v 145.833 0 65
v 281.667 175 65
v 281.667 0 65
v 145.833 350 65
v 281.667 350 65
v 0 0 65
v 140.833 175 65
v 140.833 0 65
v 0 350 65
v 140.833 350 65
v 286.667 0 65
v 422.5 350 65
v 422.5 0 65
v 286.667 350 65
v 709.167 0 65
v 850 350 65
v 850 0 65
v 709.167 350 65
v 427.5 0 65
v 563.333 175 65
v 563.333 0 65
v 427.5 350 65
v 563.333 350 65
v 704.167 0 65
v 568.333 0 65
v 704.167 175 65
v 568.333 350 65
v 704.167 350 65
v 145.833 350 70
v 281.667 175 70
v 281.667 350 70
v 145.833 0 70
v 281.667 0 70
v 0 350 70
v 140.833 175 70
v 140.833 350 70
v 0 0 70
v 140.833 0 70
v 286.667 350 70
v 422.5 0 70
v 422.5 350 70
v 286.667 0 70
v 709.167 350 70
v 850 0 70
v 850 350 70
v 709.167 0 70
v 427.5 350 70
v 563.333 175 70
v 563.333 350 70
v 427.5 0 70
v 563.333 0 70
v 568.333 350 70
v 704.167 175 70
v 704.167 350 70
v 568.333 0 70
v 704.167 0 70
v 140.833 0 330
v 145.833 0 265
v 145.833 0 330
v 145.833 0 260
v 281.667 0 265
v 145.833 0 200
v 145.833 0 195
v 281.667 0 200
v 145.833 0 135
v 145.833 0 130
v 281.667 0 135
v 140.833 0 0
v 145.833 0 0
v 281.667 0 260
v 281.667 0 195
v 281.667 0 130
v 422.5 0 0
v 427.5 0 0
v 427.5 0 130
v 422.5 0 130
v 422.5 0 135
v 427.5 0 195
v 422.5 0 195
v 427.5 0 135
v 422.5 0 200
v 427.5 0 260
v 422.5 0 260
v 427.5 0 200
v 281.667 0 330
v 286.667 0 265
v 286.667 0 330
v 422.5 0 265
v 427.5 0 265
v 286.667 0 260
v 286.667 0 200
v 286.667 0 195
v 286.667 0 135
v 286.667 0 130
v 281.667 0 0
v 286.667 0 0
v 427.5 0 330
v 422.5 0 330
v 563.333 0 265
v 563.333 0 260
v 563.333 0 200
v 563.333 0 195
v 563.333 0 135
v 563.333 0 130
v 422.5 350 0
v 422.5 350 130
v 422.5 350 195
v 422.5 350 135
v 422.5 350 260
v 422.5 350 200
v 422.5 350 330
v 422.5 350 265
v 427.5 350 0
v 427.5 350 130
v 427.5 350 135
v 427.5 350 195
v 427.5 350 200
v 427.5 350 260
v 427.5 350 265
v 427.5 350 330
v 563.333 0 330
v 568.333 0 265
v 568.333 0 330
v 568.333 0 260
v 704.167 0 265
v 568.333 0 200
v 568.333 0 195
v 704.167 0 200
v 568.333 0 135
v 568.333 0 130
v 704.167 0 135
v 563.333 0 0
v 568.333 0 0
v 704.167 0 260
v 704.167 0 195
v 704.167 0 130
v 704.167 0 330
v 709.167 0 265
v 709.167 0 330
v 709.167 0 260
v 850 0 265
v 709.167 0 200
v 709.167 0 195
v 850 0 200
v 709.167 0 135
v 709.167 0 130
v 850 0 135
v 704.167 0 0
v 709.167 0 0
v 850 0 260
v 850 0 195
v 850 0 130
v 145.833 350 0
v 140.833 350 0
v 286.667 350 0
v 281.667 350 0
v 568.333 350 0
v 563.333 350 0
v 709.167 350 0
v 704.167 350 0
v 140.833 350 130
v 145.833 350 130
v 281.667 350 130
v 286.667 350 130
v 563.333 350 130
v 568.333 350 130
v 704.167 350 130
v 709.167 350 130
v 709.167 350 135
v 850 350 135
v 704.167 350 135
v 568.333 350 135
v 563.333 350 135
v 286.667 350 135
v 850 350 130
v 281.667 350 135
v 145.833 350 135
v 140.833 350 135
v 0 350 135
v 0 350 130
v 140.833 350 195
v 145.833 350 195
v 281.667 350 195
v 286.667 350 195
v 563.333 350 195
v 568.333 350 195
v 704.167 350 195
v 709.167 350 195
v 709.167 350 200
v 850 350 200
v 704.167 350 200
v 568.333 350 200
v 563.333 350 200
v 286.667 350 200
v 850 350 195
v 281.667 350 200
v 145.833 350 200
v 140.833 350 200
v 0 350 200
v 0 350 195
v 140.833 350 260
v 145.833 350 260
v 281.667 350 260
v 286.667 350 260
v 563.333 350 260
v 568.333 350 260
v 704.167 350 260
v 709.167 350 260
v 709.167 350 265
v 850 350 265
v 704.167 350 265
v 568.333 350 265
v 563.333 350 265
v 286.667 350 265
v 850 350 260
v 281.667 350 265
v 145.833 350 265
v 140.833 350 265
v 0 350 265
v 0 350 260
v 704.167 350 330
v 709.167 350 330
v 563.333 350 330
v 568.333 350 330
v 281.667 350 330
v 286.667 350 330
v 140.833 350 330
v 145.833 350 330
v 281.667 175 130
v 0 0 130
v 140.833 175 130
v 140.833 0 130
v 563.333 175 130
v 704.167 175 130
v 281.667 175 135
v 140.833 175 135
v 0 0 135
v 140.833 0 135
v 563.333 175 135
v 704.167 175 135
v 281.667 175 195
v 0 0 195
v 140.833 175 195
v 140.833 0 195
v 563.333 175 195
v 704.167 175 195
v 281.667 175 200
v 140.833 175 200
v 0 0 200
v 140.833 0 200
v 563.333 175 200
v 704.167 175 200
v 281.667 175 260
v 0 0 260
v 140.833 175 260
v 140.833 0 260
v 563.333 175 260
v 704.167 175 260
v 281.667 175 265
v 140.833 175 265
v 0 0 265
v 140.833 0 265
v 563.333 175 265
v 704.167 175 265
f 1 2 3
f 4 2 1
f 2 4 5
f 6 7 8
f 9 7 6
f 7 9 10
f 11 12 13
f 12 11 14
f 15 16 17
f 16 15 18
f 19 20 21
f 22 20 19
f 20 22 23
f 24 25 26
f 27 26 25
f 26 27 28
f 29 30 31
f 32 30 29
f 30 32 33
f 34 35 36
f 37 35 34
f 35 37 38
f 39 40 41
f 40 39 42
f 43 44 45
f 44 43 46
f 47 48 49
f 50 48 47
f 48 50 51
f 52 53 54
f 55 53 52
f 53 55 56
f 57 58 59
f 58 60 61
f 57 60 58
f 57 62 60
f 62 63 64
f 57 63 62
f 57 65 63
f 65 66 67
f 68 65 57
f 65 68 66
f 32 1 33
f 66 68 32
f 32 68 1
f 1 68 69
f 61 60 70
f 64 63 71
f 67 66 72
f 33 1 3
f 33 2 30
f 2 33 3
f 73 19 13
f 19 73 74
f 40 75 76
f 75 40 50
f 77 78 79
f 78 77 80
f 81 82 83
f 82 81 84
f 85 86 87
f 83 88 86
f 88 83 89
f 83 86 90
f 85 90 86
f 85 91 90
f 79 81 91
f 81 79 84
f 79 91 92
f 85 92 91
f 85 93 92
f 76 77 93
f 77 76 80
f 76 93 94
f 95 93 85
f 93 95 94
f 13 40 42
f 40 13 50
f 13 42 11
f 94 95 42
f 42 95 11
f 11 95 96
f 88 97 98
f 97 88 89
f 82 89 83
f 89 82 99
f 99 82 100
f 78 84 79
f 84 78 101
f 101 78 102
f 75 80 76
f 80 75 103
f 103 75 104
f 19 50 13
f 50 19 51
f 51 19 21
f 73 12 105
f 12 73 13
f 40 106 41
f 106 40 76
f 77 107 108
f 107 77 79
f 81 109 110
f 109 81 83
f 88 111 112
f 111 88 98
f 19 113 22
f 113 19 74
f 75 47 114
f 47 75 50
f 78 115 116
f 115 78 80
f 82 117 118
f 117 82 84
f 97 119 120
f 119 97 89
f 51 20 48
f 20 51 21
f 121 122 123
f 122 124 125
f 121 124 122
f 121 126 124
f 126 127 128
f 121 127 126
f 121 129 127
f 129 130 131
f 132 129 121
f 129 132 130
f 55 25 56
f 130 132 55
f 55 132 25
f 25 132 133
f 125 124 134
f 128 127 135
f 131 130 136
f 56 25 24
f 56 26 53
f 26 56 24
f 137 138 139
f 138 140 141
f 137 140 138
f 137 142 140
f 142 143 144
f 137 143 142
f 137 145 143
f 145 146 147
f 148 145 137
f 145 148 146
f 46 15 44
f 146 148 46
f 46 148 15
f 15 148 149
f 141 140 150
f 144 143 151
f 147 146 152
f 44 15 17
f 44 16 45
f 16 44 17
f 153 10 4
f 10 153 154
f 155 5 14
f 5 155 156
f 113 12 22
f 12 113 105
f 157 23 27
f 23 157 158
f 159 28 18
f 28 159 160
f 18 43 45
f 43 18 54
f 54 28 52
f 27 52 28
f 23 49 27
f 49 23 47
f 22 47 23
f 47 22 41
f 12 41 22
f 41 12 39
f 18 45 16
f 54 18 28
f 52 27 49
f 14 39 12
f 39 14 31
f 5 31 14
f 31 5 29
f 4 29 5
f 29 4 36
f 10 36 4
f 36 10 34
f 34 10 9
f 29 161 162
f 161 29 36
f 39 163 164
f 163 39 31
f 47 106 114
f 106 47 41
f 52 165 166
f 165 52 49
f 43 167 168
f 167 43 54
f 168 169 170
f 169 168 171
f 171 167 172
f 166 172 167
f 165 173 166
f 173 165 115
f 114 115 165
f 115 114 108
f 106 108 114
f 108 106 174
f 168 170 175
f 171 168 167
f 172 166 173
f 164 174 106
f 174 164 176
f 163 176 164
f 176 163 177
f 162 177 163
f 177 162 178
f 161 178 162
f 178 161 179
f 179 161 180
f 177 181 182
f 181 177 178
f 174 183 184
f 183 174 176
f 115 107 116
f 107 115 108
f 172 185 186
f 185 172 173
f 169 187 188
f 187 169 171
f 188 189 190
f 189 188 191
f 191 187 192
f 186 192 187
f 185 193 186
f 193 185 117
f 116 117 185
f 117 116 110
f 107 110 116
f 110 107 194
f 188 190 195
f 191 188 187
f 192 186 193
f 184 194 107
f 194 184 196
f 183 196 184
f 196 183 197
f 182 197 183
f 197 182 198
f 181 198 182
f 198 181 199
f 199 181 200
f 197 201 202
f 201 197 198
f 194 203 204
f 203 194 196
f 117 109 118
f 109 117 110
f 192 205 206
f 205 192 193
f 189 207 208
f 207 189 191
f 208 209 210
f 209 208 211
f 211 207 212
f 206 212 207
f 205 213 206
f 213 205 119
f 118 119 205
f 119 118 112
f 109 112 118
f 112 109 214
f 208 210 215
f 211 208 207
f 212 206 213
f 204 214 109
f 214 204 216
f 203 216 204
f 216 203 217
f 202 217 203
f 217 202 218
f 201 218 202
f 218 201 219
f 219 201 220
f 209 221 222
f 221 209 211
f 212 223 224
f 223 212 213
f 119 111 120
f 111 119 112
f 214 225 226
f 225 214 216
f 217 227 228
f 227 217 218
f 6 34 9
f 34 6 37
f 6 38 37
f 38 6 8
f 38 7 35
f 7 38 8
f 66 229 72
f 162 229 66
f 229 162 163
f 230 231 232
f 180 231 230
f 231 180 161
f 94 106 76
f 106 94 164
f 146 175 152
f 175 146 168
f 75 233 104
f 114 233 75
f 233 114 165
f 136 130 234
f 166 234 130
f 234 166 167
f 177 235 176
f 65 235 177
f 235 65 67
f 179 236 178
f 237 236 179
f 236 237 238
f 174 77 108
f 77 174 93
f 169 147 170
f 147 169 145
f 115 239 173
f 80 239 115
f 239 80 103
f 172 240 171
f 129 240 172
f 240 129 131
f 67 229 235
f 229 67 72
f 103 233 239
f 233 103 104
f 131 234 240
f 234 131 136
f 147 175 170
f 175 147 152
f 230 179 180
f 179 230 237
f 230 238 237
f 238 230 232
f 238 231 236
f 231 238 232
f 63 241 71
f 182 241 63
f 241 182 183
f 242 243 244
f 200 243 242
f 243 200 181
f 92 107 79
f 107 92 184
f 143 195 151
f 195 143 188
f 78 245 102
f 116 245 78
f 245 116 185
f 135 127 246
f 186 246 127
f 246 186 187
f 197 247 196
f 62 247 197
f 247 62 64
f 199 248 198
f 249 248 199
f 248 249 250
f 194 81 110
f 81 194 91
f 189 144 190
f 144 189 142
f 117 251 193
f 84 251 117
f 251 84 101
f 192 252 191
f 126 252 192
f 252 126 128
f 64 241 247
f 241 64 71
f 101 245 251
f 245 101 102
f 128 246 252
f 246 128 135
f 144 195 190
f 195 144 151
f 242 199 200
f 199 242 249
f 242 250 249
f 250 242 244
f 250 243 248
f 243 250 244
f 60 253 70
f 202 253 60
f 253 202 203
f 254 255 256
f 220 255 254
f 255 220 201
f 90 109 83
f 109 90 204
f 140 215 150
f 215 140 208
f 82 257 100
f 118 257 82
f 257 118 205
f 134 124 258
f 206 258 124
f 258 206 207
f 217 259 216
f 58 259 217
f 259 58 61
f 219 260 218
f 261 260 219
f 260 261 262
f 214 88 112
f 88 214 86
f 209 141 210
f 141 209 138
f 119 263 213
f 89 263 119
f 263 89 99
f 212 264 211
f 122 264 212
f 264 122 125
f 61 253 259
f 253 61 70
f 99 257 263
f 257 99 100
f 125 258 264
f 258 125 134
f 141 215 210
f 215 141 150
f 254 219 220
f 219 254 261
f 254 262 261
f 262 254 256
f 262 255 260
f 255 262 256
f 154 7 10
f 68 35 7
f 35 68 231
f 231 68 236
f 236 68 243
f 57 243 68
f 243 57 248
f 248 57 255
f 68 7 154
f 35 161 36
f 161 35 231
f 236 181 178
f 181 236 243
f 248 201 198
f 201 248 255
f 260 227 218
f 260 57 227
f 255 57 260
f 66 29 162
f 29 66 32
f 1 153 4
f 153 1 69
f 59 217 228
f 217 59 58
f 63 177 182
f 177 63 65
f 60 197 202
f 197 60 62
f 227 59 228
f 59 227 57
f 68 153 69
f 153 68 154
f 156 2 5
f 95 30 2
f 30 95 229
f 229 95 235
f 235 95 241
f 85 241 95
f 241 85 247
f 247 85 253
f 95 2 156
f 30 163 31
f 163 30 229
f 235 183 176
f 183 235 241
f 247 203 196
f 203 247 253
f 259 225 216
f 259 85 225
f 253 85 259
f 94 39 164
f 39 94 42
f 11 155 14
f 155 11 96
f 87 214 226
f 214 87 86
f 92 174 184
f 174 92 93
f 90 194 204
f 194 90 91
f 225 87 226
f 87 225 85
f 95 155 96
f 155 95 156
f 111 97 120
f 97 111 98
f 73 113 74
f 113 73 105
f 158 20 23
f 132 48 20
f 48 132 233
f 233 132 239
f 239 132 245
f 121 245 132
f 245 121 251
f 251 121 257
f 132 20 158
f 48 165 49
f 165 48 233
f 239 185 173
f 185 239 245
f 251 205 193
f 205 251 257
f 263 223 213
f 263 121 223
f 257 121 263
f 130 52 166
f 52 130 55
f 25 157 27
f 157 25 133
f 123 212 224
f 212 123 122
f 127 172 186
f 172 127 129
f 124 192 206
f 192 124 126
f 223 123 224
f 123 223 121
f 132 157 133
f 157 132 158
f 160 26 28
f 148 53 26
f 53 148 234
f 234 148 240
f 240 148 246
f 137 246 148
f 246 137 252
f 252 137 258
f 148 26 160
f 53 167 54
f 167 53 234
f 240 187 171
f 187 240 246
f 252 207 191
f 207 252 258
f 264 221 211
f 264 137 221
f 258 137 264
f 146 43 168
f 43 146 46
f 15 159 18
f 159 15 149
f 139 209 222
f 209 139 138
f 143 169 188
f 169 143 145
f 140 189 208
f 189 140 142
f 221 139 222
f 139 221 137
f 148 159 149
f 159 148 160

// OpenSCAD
/*Compartments
Simple Script to generate Compartments for a rectangular container.
*/

//Settings
xNr = 5;
yNr = 6;
xD = 330;
yD = 850;
depth = 350;
thickness = 5;
end = 1;
margin = .001;

//Make Planes
module horizontalPlane() {
    linear_extrude(height=thickness)difference() {
        square([yD,depth]);
        for(i=[end:yNr-end])translate([i*(yD-thickness)/yNr,0])square([thickness,depth/2]);
    }
}
module verticalPlane() {
    linear_extrude(height=thickness)translate([xD,depth])rotate(a=[0,0,180])difference() {
        square([xD,depth]);
        for(i=[end:xNr-end])translate([i*(xD-thickness)/xNr,0])square([thickness,depth/2]);
    }
}

//Render
module render() {
    for(i=[end:xNr-end])translate([0,0,i*(xD-thickness)/xNr])horizontalPlane();
    for(i=[end:yNr-end])translate([i*(yD-thickness)/yNr,0,0])translate([0,0,xD])rotate([0,90,0])verticalPlane();
}    
//Export
module export() {
    for(i=[end:yNr-end])translate([yD+margin,i*(depth+margin),0])projection()verticalPlane();
    for(i=[end:xNr-end])translate([0,i*(depth+margin)])projection()horizontalPlane();
}

!render();
export();
